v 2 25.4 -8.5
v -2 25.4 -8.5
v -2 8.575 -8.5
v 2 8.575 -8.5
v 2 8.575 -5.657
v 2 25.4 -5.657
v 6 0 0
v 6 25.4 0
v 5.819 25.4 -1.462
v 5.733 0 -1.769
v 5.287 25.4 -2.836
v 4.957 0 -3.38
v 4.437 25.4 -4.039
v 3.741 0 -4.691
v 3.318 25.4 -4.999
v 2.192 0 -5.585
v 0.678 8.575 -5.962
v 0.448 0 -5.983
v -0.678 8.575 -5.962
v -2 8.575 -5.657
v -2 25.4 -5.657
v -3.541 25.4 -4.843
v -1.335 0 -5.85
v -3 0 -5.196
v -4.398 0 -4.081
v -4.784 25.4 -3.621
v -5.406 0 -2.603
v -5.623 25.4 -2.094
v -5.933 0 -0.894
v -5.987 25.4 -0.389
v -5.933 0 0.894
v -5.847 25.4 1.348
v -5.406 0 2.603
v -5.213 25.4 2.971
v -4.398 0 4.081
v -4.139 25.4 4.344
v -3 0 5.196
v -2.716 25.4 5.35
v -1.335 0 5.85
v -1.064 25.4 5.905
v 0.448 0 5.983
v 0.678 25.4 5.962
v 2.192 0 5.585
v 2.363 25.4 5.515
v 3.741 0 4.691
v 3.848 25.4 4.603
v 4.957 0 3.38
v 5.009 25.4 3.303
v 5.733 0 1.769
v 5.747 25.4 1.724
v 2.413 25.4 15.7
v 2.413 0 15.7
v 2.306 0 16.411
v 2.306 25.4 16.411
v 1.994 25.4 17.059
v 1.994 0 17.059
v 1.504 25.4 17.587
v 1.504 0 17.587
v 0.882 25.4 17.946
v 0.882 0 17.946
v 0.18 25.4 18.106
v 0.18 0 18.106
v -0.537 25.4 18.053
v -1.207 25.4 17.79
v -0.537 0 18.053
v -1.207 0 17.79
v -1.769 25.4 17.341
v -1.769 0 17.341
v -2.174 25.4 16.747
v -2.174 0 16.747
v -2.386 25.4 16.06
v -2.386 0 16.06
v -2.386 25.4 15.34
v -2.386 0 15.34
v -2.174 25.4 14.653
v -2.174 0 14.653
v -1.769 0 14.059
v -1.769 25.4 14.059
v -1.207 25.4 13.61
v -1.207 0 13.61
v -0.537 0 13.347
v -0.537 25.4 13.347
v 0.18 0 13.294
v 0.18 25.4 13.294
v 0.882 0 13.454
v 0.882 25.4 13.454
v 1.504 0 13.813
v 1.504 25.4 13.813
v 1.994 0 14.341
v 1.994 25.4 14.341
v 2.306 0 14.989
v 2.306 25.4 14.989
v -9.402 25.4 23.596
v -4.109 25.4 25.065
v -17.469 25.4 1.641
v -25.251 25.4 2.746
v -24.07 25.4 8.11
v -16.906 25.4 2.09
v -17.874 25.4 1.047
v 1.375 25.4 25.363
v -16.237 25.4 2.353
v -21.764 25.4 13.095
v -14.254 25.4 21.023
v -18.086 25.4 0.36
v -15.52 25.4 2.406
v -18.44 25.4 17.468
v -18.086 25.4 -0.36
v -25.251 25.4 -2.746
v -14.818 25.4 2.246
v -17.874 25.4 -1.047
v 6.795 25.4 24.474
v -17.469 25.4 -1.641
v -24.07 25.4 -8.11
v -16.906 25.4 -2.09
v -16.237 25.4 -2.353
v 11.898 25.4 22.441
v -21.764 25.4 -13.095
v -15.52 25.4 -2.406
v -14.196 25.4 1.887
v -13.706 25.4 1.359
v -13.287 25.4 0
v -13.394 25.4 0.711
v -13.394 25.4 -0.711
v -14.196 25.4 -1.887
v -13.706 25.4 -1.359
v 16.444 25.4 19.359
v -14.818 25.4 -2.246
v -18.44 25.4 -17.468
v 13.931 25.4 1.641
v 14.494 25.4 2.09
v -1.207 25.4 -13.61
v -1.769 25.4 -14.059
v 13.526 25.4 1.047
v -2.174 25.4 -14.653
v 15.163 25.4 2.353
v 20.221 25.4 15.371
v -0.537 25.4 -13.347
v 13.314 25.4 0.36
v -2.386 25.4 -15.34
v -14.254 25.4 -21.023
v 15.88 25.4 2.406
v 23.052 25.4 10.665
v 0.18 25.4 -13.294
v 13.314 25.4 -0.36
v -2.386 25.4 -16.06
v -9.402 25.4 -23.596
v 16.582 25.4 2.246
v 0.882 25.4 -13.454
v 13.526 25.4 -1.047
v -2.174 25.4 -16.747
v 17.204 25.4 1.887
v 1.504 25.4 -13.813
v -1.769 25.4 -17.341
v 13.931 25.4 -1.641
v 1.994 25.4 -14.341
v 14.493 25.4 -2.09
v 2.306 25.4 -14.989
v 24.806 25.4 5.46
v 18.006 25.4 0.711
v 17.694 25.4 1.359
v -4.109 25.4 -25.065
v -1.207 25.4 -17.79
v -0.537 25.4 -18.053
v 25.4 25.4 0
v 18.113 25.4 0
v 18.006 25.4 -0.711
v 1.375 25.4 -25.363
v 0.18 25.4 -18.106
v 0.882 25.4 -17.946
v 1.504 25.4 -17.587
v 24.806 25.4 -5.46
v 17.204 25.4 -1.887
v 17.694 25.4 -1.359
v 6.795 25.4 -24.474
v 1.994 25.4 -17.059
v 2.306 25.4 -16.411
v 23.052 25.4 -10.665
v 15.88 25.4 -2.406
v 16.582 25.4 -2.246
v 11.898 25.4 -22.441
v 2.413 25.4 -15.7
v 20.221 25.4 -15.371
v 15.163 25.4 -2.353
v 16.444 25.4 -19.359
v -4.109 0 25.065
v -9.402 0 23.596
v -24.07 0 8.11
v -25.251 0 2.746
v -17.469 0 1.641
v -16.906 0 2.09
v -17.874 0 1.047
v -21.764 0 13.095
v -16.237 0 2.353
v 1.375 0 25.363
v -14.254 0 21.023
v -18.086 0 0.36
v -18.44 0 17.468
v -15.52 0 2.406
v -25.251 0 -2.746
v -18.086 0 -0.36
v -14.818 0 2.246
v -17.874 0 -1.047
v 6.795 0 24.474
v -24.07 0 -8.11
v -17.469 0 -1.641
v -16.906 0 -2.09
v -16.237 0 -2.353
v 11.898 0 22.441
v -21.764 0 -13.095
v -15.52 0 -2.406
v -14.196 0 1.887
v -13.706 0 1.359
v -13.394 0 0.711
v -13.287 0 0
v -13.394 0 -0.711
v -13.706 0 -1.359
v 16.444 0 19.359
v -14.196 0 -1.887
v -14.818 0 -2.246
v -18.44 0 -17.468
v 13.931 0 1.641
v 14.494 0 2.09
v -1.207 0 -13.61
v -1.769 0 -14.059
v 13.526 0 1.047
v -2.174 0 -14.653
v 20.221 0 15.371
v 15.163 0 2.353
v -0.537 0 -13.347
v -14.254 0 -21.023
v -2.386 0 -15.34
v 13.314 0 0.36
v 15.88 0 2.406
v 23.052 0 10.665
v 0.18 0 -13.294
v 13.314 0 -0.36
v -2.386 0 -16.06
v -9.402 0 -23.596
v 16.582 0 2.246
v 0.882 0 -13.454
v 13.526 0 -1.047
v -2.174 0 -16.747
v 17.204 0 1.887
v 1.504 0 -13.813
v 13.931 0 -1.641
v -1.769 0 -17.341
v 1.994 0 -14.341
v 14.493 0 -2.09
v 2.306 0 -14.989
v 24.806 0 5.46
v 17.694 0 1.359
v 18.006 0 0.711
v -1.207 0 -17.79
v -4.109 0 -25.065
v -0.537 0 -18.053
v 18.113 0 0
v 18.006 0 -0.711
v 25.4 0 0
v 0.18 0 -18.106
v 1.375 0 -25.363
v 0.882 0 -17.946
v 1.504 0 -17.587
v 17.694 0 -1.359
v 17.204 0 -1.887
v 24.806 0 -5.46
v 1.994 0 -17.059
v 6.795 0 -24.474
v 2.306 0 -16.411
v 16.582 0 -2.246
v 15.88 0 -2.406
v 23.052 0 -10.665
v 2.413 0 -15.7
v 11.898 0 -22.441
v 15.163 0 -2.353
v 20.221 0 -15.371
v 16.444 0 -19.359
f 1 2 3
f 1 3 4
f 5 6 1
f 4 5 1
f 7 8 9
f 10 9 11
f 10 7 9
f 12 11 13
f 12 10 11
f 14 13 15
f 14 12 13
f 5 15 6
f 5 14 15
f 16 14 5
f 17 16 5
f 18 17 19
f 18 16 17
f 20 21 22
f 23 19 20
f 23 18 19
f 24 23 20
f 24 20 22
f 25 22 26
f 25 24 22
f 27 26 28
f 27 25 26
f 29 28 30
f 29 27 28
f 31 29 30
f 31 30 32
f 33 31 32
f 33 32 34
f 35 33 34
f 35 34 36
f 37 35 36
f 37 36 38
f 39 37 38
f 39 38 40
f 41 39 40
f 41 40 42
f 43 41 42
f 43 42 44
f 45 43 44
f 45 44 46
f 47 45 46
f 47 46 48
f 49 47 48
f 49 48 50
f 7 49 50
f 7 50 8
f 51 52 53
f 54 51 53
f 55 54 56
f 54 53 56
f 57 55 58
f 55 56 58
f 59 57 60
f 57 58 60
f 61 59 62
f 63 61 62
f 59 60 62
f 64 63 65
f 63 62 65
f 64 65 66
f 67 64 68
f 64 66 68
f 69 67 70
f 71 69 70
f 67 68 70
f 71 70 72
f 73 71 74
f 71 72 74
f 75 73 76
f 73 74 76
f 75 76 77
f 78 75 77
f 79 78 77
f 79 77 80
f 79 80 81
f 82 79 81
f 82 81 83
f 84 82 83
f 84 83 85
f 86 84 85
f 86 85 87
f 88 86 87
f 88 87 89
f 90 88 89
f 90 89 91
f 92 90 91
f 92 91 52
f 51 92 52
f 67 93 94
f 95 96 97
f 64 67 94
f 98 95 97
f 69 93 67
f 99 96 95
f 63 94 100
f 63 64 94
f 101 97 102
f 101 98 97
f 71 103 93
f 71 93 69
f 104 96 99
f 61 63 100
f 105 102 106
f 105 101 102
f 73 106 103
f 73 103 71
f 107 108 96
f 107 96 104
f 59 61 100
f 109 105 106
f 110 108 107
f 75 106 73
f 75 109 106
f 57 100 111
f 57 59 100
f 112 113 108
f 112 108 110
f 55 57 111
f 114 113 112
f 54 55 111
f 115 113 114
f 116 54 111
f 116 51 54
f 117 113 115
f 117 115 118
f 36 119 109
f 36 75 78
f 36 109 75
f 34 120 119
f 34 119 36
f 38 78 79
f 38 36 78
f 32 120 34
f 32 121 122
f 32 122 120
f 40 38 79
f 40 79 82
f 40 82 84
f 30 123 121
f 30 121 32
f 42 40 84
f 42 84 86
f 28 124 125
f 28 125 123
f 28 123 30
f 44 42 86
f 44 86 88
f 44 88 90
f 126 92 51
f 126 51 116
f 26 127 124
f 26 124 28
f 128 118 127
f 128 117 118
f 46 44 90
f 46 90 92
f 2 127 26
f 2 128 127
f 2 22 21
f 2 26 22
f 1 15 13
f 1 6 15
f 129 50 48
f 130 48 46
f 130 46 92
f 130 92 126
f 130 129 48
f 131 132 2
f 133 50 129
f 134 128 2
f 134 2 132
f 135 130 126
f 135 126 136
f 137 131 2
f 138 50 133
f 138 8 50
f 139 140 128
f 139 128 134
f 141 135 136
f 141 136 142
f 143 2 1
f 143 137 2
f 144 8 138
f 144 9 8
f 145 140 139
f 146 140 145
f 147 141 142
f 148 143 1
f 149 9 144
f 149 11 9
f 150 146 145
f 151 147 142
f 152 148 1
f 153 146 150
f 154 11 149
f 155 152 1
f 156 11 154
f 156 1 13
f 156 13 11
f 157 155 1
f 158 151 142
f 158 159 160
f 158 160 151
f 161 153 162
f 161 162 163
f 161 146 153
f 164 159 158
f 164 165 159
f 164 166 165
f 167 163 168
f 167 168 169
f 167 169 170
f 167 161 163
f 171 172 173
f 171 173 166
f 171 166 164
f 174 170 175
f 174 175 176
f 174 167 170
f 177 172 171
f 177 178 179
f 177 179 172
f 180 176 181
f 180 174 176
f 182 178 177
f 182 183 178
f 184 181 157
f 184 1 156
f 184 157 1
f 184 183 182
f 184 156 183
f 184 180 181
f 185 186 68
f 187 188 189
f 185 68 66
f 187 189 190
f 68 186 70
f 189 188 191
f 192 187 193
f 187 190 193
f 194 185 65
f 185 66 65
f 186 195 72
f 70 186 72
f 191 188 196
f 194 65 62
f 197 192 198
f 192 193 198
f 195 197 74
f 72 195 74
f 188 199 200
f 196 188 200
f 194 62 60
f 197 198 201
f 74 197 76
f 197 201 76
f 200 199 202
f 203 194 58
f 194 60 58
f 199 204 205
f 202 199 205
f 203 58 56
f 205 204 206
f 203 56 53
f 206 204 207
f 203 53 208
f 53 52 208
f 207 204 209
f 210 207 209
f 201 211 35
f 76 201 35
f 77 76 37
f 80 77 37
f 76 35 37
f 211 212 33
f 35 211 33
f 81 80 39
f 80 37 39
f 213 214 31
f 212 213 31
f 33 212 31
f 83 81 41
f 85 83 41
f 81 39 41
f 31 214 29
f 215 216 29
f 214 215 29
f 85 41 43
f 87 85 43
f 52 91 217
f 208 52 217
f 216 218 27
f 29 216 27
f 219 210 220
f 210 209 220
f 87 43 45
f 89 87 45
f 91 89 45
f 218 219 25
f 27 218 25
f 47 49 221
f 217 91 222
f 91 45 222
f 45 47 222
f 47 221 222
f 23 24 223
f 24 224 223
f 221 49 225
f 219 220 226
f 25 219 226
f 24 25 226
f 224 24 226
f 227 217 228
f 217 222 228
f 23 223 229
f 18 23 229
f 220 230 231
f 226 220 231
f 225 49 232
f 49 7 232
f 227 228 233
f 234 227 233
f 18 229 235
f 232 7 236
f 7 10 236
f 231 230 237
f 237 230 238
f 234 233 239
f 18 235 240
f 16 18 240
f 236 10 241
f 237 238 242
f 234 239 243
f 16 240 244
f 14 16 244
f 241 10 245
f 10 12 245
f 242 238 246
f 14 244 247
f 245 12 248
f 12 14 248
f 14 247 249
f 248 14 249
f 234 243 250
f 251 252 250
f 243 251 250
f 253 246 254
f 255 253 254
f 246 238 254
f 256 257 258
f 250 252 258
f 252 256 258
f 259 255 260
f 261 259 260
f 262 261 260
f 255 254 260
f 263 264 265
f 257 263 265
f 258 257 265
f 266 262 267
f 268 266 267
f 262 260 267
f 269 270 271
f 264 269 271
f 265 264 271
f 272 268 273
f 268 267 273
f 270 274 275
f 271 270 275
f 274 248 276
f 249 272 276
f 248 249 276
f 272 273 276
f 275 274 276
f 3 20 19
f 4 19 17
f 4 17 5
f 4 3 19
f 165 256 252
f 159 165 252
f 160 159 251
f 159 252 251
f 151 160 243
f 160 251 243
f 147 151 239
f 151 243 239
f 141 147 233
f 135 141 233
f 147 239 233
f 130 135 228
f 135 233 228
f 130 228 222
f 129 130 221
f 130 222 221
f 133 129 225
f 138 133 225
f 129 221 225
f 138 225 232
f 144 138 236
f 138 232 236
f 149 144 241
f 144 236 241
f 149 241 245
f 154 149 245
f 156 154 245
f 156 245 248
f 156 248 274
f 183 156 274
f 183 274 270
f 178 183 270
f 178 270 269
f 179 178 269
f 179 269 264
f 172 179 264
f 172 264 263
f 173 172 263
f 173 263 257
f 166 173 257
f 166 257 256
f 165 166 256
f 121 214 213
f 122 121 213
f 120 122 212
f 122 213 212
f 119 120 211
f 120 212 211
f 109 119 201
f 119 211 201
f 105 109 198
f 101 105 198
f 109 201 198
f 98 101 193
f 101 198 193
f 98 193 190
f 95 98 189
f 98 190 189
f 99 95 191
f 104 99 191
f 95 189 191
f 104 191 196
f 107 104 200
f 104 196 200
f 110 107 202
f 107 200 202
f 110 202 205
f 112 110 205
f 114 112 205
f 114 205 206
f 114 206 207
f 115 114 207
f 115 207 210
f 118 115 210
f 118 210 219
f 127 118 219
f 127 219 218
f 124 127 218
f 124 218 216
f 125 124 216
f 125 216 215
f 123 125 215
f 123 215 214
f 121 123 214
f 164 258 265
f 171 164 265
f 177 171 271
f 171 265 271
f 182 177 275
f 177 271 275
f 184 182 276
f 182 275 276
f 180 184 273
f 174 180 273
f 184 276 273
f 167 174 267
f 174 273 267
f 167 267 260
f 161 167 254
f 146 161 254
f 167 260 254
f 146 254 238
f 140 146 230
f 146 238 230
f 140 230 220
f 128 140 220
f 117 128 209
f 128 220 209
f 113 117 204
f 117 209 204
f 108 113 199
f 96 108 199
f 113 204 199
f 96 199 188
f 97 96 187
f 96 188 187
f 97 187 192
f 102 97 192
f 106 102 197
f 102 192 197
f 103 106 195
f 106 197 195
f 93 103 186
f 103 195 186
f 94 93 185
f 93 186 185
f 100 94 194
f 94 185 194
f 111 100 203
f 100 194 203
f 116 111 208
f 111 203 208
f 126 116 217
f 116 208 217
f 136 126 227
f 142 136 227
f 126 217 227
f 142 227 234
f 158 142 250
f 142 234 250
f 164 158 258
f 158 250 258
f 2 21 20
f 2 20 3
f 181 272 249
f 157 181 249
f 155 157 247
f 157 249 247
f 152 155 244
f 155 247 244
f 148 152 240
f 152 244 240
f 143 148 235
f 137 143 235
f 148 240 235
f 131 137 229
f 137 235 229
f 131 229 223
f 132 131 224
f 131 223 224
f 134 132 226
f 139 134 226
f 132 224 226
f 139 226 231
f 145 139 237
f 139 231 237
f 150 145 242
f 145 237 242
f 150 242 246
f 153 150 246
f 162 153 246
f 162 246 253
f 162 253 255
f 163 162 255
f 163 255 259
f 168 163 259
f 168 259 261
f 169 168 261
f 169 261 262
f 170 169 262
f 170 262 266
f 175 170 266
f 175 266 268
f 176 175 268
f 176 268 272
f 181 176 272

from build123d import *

# Parameters (mm, degrees)
SKETCH1_R           = 25.4
SKETCH1_R_2         = 6
BOSS_EXTRUDE1_DEPTH = 25.4
SKETCH2_W           = 4
SKETCH2_H           = 5
CUT_EXTRUDE1_DEPTH  = 16.825
SKETCH3_R           = 2.413
CUT_EXTRUDE2_DEPTH  = 26.4


with BuildPart() as part:
    # Sketch1 → Boss-Extrude1 (new body)
    with BuildSketch(Plane(origin=(0, 0, 0), x_dir=(1, 0, 0), z_dir=(0, 1, 0))):
        Circle(SKETCH1_R)
        Circle(SKETCH1_R_2, mode=Mode.SUBTRACT)
    extrude(amount=BOSS_EXTRUDE1_DEPTH)

    # Sketch2 → Cut-Extrude1 (cut)
    with BuildSketch(Plane(origin=(0, 25.4, 0), x_dir=(1, 0, 0), z_dir=(0, 1, 0))):
        with Locations((0, 6)):
            Rectangle(SKETCH2_W, SKETCH2_H)
    extrude(amount=-CUT_EXTRUDE1_DEPTH, mode=Mode.SUBTRACT)

    # Sketch3 → Cut-Extrude2 (cut, through all)
    with BuildSketch(Plane.XZ):
        with Locations((0, -15.7)):
            Circle(SKETCH3_R)
        with Locations((-15.7, 0)):
            Circle(SKETCH3_R)
        with Locations((0, 15.7)):
            Circle(SKETCH3_R)
        with Locations((15.7, 0)):
            Circle(SKETCH3_R)
    extrude(amount=-CUT_EXTRUDE2_DEPTH, mode=Mode.SUBTRACT)


solid = part.part
